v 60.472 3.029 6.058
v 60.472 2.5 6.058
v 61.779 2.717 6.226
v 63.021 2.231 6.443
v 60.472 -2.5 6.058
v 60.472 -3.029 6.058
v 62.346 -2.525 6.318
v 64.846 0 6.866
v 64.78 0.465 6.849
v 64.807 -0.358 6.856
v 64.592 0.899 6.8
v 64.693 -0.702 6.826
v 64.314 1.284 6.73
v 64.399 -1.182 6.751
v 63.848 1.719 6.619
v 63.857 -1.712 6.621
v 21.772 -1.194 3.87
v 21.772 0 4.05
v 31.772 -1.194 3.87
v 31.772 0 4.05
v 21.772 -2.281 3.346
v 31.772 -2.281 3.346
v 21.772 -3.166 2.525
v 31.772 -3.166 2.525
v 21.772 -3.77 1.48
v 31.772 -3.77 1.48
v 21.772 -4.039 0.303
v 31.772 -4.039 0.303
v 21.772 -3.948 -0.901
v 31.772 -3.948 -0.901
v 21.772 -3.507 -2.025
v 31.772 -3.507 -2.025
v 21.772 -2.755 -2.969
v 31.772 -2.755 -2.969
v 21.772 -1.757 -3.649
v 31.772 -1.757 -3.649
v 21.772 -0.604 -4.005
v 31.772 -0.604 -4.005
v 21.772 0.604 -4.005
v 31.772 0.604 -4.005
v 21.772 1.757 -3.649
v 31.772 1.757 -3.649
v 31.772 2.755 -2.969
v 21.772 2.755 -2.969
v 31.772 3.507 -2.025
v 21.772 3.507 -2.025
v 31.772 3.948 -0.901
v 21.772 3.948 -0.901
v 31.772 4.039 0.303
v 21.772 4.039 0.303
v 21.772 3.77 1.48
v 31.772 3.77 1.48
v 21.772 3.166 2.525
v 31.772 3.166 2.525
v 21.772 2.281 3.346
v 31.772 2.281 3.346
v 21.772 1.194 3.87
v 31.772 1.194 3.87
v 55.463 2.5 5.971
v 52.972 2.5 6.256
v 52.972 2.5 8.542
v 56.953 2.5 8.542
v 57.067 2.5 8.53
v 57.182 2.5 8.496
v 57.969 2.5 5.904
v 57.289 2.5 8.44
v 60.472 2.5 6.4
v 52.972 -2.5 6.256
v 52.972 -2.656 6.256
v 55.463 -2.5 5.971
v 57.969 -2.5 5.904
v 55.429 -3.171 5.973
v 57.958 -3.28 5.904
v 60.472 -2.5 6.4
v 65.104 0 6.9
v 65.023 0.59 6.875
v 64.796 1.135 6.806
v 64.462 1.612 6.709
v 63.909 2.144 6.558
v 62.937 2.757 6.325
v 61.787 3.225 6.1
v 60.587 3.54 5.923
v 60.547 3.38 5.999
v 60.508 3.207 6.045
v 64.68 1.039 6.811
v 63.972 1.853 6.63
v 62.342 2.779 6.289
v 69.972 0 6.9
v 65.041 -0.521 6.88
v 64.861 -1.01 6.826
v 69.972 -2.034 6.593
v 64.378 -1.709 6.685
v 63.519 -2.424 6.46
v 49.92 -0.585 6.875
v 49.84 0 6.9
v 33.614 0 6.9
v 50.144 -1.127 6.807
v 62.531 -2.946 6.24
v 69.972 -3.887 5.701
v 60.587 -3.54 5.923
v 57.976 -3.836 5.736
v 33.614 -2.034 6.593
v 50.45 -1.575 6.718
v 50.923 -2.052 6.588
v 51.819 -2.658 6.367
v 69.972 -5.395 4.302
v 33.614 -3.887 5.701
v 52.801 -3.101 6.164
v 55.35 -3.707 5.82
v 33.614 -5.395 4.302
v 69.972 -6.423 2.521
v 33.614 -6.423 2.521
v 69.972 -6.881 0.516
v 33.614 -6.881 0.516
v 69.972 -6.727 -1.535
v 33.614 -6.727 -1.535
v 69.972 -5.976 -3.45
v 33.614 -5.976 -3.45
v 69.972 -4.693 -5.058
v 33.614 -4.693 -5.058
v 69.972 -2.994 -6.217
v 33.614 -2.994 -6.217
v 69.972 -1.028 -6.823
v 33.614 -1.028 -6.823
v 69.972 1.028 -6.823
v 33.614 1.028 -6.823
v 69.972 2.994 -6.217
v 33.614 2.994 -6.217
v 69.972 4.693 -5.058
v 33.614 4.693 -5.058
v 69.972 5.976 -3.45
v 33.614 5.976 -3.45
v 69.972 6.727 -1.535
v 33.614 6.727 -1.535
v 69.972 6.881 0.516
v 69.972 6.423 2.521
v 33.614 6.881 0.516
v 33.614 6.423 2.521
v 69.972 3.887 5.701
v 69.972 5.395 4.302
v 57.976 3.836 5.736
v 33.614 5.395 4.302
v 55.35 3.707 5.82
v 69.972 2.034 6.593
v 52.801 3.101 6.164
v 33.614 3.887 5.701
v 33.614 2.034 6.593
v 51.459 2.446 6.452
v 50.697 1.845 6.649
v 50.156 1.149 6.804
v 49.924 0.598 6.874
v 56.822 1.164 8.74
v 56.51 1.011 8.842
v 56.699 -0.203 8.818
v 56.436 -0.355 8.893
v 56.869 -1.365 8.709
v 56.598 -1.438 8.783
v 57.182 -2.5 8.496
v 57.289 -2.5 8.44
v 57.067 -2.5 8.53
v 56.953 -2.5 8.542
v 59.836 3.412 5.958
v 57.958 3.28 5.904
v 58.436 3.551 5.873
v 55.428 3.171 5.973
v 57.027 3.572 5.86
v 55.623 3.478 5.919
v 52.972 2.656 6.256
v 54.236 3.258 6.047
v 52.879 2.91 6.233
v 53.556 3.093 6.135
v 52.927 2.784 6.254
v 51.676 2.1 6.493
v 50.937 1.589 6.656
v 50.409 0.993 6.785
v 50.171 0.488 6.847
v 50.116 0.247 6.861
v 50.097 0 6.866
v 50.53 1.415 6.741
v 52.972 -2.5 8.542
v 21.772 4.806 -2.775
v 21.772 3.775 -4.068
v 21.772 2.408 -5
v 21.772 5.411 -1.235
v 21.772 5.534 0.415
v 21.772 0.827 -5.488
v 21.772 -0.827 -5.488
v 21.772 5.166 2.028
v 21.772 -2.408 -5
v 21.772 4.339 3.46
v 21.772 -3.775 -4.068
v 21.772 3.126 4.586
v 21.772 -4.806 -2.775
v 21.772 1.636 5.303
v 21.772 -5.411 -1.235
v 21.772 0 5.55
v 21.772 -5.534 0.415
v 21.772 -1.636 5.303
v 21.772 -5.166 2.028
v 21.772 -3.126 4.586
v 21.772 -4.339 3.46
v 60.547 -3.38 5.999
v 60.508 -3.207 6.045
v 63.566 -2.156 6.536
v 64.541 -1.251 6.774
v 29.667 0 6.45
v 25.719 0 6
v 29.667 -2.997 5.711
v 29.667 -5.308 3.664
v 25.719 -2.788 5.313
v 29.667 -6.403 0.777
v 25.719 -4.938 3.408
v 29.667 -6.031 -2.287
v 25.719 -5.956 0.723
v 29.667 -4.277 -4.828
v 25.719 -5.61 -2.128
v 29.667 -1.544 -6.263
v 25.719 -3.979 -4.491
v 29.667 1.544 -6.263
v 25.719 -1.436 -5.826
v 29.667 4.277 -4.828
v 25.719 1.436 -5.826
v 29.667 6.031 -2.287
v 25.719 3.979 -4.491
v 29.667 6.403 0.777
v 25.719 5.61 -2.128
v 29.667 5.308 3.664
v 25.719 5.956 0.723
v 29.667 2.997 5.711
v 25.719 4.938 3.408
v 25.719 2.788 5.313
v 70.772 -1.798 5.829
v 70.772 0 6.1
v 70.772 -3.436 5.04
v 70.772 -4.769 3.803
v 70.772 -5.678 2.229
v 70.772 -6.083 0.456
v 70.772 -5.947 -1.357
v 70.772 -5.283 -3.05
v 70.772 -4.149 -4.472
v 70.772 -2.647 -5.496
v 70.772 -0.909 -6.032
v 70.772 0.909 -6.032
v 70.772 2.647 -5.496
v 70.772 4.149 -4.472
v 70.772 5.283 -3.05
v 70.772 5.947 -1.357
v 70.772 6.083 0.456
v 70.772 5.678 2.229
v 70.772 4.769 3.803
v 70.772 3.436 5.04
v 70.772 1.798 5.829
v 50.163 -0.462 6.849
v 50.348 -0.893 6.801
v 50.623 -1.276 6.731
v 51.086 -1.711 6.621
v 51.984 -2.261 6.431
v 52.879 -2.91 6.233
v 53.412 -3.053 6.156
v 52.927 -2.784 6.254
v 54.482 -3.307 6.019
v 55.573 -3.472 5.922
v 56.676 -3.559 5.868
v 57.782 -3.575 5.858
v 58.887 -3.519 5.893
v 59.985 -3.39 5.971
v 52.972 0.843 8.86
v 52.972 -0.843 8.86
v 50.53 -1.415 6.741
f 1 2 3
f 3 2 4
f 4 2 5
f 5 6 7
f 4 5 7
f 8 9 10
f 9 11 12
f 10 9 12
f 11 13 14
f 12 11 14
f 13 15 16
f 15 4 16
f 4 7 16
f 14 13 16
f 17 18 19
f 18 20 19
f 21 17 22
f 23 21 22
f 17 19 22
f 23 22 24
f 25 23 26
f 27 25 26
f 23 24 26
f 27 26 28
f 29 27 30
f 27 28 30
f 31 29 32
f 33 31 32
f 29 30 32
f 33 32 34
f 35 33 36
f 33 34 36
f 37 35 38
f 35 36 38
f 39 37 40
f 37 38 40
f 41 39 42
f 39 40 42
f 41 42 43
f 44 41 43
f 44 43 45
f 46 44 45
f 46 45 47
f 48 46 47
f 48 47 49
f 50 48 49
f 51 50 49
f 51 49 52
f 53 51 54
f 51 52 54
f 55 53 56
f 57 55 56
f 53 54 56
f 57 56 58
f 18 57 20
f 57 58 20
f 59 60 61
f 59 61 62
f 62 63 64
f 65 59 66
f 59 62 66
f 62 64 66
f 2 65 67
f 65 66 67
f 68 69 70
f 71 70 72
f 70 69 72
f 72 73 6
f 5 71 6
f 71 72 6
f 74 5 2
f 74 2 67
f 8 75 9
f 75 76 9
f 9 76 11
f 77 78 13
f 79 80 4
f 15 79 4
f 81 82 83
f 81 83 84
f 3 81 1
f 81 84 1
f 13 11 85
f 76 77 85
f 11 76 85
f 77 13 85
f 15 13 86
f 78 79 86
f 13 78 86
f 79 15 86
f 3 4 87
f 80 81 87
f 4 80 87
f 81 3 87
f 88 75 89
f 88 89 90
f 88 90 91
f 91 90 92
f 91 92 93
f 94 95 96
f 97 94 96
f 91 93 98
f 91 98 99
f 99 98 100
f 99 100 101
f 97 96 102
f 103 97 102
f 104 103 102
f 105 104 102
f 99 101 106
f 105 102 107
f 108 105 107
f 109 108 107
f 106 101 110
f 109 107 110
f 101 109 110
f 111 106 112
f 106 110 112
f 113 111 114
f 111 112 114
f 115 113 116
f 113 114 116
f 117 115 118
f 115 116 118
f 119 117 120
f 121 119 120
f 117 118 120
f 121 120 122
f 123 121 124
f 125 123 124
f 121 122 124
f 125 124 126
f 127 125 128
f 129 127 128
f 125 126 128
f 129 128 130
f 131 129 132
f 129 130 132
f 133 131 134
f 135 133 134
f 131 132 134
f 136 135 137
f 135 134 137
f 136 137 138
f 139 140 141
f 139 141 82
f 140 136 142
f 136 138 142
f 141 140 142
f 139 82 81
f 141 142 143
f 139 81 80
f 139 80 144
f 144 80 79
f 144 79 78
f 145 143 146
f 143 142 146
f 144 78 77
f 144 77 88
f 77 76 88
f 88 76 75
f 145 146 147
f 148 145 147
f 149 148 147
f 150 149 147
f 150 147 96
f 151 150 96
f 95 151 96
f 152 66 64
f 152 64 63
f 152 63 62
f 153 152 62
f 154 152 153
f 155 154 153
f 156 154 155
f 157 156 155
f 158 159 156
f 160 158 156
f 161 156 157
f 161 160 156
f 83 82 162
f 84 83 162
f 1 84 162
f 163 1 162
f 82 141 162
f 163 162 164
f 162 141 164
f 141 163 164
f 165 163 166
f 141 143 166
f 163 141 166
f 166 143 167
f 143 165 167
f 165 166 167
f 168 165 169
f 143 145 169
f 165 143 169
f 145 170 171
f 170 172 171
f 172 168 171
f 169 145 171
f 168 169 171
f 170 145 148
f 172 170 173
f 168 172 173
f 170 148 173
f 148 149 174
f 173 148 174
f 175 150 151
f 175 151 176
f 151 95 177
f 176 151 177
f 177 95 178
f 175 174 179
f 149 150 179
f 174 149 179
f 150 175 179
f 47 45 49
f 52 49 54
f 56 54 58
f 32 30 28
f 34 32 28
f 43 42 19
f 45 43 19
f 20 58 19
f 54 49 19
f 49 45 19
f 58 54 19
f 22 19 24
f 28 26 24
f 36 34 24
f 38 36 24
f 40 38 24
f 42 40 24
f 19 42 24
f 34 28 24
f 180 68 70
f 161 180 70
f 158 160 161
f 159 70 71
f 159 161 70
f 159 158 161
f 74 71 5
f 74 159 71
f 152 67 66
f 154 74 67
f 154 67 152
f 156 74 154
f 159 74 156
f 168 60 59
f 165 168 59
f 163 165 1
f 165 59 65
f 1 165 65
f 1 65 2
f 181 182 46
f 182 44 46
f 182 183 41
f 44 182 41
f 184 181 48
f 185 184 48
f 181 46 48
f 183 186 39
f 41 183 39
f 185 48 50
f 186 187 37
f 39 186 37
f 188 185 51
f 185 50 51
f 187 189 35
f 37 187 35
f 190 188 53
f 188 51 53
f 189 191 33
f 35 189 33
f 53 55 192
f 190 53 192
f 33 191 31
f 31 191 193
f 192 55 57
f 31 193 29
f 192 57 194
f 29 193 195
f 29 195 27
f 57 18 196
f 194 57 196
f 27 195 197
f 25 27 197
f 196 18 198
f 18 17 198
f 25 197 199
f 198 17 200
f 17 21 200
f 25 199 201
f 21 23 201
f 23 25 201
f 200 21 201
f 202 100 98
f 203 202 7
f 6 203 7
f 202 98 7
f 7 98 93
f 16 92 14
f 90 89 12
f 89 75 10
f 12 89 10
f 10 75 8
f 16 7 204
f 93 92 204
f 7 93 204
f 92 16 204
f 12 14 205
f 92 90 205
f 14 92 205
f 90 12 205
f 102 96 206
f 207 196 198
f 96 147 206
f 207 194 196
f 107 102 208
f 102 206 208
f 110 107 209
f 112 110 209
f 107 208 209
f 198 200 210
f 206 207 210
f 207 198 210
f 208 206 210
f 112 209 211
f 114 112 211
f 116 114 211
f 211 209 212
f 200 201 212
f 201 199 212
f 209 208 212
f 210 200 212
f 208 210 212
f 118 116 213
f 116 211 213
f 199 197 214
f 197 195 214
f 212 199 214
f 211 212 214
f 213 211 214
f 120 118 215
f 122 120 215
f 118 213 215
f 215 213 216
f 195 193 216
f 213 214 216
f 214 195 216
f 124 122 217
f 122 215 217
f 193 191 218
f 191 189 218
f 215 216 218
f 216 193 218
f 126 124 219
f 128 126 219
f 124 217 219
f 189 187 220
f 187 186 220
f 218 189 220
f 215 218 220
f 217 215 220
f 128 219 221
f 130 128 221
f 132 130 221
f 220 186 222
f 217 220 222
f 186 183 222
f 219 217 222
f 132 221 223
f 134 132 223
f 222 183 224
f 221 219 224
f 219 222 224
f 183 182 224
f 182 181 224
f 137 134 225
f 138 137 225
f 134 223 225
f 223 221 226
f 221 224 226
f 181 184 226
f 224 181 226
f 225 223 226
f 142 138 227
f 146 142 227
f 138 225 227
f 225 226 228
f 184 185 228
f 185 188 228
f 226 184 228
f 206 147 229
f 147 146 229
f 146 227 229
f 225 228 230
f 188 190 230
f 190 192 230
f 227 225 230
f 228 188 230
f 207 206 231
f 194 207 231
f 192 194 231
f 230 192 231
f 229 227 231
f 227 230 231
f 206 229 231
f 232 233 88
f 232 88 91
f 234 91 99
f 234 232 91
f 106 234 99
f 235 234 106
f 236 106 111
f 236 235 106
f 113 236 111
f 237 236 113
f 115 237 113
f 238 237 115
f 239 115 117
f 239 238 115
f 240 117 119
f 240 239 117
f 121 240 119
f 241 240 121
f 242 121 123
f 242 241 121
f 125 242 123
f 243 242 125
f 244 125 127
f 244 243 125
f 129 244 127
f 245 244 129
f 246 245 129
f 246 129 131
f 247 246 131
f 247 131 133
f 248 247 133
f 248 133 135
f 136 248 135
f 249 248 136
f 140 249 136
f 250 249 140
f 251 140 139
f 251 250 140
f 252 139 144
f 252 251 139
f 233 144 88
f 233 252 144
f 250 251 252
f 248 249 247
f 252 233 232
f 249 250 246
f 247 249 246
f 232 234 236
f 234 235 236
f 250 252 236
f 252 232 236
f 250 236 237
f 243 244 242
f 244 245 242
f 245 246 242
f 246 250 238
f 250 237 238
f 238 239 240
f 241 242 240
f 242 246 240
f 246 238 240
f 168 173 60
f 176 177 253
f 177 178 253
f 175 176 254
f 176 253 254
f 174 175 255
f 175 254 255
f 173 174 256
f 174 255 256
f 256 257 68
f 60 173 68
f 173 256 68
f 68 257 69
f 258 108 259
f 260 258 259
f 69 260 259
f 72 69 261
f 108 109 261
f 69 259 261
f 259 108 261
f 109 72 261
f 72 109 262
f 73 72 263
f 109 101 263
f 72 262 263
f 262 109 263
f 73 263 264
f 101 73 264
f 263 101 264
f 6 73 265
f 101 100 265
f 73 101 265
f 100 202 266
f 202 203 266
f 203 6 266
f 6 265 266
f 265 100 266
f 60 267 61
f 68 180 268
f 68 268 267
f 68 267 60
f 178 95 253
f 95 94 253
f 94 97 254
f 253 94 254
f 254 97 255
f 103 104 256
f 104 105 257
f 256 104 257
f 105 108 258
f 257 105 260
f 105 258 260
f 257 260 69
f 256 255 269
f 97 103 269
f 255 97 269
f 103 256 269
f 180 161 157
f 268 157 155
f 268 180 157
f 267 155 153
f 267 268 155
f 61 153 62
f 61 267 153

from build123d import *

# Parameters (mm, degrees)
F4_DEPTH = 12.5
F5_R     = 1
F6_DEPTH = 2.5
F7_SIZE  = 0.8
F8_R     = 9.2444577991
F8_R_2   = 8.9
F9_DEPTH = 17.801
F10_R    = 0.5


with BuildPart() as f2:
    # F1 (on Front) → F2 (revolve)
    with BuildSketch(Plane.XZ):
        Polygon((33.6140350877, 6.9), (21.7719298246, 5.55), (21.7719298246, 4.05), (31.7719298246, 4.05), (31.7719298246, 0), (70.7719298246, 0), (70.7719298246, 6.9), align=None)
    revolve(axis=Axis((6, 0, 0), (1, 0, 0)))

    # F3 (on Front) → F4 (cut, symmetric)
    with BuildSketch(Plane.XZ):
        with BuildLine():
            Line((52.9719298246, 6.9), (52.9719298246, 6.2559245818))
            ThreePointArc((52.9719298246, 6.2559245818), (56.7154053617, 5.909998764), (60.4719298246, 6.0576393039))
            Line((60.4719298246, 6.0576393039), (60.4719298246, 6.4))
            Line((60.4719298246, 6.4), (59.6919298246, 6.9))
            Line((59.6919298246, 6.9), (52.9719298246, 6.9))
        make_face()
        with BuildLine():
            Line((60.4719298246, 6.4), (60.4719298246, 6.0576393039))
            ThreePointArc((60.4719298246, 6.0576393039), (62.7387972888, 6.3887114723), (64.9719298246, 6.9))
            Line((64.9719298246, 6.9), (59.6919298246, 6.9))
            Line((59.6919298246, 6.9), (60.4719298246, 6.4))
        make_face()
        with BuildLine():
            ThreePointArc((49.9719298246, 6.9), (51.4632936826, 6.5377365269), (52.9719298246, 6.2559245818))
            Line((52.9719298246, 6.2559245818), (52.9719298246, 6.9))
            Line((52.9719298246, 6.9), (49.9719298246, 6.9))
        make_face()
    extrude(amount=F4_DEPTH, both=True, mode=Mode.SUBTRACT)

    # F5
    f5_edges = [f2.edges().sort_by_distance(p)[0] for p in [
        (57.47193, -3.577709, 5.9),
        (57.47193, 3.577709, 5.9),
    ]]
    fillet(f5_edges, radius=F5_R)

    # F3 (on Front) → F6 (join, symmetric)
    with BuildSketch(Plane.XZ):
        Polygon((52.9719298246, 8.9), (52.9719298246, 6.9), (59.6919298246, 6.9), (56.5719298246, 8.9), align=None)
        with BuildLine():
            Line((52.9719298246, 6.9), (52.9719298246, 6.2559245818))
            ThreePointArc((52.9719298246, 6.2559245818), (56.7154053617, 5.909998764), (60.4719298246, 6.0576393039))
            Line((60.4719298246, 6.0576393039), (60.4719298246, 6.4))
            Line((60.4719298246, 6.4), (59.6919298246, 6.9))
            Line((59.6919298246, 6.9), (52.9719298246, 6.9))
        make_face()
        with BuildLine():
            Line((52.9719298246, 6.2559245818), (52.9719298246, 4.9))
            Line((52.9719298246, 4.9), (60.4719298246, 4.9))
            Line((60.4719298246, 4.9), (60.4719298246, 6.0576393039))
            ThreePointArc((60.4719298246, 6.0576393039), (56.7154053617, 5.909998764), (52.9719298246, 6.2559245818))
        make_face()
    extrude(amount=F6_DEPTH, both=True)

    # F7
    f7_edges = [f2.edges().sort_by_distance(p)[0] for p in [
        (70.77193, 0, -6.9),
    ]]
    chamfer(f7_edges, length=F7_SIZE)

    # F8 (on face) → F9 (cut, through all)
    with BuildSketch(Plane(origin=(52.9719298246, 0, 0), x_dir=(0, -1, 0), z_dir=(-1, 0, 0))):
        Circle(F8_R)
        Circle(F8_R_2, mode=Mode.SUBTRACT)
    extrude(amount=-F9_DEPTH, mode=Mode.SUBTRACT)

    # F10
    f10_edges = [f2.edges().sort_by_distance(p)[0] for p in [
        (56.718854, -1.291345, 8.805818),
        (56.718854, 1.291345, 8.805818),
    ]]
    fillet(f10_edges, radius=F10_R)


solid = f2.part
